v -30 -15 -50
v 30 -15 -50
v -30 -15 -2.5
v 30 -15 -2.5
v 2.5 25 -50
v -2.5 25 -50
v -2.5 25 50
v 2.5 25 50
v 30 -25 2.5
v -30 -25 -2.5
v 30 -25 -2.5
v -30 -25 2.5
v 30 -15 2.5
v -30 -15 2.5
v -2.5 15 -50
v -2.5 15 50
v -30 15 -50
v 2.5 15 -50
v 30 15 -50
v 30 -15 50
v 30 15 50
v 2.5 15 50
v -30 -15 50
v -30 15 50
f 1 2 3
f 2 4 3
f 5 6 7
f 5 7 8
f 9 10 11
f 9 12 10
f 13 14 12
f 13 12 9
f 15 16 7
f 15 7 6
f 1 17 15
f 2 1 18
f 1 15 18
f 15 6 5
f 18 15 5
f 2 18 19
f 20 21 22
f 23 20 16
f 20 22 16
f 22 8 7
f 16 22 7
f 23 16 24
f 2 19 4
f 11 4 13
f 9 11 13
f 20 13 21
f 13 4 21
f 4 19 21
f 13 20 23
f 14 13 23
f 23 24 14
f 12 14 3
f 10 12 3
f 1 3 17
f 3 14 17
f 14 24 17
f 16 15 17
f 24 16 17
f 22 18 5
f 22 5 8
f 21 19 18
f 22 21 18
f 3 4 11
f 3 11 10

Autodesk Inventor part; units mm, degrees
ref_plane "YZ Plane" through (0, 0, 0) normal (1, 0, 0) x (0, 1, 0)
ref_plane "XZ Plane" through (0, 0, 0) normal (0, 1, 0) x (-1, 0, 0)
ref_plane "XY Plane" through (0, 0, 0) normal (0, 0, 1) x (1, 0, 0)
sketch "草图3" plane through (0, 0, 0) normal (0, 1, 0) x (-1, 0, 0)
  line L0 (-30, 50) -> (30, 50)
  line L1 (30, 50) -> (30, -50)
  line L2 (30, -50) -> (-30, -50)
  line L3 (-30, -50) -> (-30, 50)
  line L4 (-30, 50) -> (30, -50) construction
  line L5 (30, 50) -> (-30, -50) construction
  point P0 (0, 0)
  dimension "d21" = 60
  dimension "d22" = 100
extrude "拉伸3" add sketch "草图3" against normal mid plane 30
sketch "草图4" plane through (0, 15, 0) normal (0, 1, 0) x (1, 0, 0)
  line L0 (-30, -50) -> (-2.5, -50)
  line L1 (30, -50) -> (-30, -50) projected
  line L2 (-2.5, -50) -> (-2.5, 50)
  line L3 (-2.5, 50) -> (2.5, 50)
  line L4 (-30, 50) -> (30, 50) projected
  line L5 (2.5, 50) -> (2.5, -50)
  line L6 (2.5, -50) -> (-2.5, -50)
  point P0 (0, 0)
  point P1 (2.5, -50)
  dimension "d25" = 27.5
  dimension "d31" = 5
extrude "拉伸4" add sketch "草图4" along normal blind 10
sketch "草图5" plane through (0, -15, 0) normal (0, -1, 0) x (1, 0, 0)
  line L0 (30, 50) -> (30, -50) projected
  line L1 (-30, 2.5) -> (30, 2.5)
  line L2 (30, 2.5) -> (30, -2.5)
  line L3 (30, -2.5) -> (-30, -2.5)
  line L4 (-30, -2.5) -> (-30, 2.5)
  line L5 (-30, 2.5) -> (30, -2.5) construction
  line L6 (30, 2.5) -> (-30, -2.5) construction
  point P0 (0, 0)
  dimension "d28" = 5
extrude "拉伸5" add sketch "草图5" along normal blind 10
properties part number "水平滑盖"
